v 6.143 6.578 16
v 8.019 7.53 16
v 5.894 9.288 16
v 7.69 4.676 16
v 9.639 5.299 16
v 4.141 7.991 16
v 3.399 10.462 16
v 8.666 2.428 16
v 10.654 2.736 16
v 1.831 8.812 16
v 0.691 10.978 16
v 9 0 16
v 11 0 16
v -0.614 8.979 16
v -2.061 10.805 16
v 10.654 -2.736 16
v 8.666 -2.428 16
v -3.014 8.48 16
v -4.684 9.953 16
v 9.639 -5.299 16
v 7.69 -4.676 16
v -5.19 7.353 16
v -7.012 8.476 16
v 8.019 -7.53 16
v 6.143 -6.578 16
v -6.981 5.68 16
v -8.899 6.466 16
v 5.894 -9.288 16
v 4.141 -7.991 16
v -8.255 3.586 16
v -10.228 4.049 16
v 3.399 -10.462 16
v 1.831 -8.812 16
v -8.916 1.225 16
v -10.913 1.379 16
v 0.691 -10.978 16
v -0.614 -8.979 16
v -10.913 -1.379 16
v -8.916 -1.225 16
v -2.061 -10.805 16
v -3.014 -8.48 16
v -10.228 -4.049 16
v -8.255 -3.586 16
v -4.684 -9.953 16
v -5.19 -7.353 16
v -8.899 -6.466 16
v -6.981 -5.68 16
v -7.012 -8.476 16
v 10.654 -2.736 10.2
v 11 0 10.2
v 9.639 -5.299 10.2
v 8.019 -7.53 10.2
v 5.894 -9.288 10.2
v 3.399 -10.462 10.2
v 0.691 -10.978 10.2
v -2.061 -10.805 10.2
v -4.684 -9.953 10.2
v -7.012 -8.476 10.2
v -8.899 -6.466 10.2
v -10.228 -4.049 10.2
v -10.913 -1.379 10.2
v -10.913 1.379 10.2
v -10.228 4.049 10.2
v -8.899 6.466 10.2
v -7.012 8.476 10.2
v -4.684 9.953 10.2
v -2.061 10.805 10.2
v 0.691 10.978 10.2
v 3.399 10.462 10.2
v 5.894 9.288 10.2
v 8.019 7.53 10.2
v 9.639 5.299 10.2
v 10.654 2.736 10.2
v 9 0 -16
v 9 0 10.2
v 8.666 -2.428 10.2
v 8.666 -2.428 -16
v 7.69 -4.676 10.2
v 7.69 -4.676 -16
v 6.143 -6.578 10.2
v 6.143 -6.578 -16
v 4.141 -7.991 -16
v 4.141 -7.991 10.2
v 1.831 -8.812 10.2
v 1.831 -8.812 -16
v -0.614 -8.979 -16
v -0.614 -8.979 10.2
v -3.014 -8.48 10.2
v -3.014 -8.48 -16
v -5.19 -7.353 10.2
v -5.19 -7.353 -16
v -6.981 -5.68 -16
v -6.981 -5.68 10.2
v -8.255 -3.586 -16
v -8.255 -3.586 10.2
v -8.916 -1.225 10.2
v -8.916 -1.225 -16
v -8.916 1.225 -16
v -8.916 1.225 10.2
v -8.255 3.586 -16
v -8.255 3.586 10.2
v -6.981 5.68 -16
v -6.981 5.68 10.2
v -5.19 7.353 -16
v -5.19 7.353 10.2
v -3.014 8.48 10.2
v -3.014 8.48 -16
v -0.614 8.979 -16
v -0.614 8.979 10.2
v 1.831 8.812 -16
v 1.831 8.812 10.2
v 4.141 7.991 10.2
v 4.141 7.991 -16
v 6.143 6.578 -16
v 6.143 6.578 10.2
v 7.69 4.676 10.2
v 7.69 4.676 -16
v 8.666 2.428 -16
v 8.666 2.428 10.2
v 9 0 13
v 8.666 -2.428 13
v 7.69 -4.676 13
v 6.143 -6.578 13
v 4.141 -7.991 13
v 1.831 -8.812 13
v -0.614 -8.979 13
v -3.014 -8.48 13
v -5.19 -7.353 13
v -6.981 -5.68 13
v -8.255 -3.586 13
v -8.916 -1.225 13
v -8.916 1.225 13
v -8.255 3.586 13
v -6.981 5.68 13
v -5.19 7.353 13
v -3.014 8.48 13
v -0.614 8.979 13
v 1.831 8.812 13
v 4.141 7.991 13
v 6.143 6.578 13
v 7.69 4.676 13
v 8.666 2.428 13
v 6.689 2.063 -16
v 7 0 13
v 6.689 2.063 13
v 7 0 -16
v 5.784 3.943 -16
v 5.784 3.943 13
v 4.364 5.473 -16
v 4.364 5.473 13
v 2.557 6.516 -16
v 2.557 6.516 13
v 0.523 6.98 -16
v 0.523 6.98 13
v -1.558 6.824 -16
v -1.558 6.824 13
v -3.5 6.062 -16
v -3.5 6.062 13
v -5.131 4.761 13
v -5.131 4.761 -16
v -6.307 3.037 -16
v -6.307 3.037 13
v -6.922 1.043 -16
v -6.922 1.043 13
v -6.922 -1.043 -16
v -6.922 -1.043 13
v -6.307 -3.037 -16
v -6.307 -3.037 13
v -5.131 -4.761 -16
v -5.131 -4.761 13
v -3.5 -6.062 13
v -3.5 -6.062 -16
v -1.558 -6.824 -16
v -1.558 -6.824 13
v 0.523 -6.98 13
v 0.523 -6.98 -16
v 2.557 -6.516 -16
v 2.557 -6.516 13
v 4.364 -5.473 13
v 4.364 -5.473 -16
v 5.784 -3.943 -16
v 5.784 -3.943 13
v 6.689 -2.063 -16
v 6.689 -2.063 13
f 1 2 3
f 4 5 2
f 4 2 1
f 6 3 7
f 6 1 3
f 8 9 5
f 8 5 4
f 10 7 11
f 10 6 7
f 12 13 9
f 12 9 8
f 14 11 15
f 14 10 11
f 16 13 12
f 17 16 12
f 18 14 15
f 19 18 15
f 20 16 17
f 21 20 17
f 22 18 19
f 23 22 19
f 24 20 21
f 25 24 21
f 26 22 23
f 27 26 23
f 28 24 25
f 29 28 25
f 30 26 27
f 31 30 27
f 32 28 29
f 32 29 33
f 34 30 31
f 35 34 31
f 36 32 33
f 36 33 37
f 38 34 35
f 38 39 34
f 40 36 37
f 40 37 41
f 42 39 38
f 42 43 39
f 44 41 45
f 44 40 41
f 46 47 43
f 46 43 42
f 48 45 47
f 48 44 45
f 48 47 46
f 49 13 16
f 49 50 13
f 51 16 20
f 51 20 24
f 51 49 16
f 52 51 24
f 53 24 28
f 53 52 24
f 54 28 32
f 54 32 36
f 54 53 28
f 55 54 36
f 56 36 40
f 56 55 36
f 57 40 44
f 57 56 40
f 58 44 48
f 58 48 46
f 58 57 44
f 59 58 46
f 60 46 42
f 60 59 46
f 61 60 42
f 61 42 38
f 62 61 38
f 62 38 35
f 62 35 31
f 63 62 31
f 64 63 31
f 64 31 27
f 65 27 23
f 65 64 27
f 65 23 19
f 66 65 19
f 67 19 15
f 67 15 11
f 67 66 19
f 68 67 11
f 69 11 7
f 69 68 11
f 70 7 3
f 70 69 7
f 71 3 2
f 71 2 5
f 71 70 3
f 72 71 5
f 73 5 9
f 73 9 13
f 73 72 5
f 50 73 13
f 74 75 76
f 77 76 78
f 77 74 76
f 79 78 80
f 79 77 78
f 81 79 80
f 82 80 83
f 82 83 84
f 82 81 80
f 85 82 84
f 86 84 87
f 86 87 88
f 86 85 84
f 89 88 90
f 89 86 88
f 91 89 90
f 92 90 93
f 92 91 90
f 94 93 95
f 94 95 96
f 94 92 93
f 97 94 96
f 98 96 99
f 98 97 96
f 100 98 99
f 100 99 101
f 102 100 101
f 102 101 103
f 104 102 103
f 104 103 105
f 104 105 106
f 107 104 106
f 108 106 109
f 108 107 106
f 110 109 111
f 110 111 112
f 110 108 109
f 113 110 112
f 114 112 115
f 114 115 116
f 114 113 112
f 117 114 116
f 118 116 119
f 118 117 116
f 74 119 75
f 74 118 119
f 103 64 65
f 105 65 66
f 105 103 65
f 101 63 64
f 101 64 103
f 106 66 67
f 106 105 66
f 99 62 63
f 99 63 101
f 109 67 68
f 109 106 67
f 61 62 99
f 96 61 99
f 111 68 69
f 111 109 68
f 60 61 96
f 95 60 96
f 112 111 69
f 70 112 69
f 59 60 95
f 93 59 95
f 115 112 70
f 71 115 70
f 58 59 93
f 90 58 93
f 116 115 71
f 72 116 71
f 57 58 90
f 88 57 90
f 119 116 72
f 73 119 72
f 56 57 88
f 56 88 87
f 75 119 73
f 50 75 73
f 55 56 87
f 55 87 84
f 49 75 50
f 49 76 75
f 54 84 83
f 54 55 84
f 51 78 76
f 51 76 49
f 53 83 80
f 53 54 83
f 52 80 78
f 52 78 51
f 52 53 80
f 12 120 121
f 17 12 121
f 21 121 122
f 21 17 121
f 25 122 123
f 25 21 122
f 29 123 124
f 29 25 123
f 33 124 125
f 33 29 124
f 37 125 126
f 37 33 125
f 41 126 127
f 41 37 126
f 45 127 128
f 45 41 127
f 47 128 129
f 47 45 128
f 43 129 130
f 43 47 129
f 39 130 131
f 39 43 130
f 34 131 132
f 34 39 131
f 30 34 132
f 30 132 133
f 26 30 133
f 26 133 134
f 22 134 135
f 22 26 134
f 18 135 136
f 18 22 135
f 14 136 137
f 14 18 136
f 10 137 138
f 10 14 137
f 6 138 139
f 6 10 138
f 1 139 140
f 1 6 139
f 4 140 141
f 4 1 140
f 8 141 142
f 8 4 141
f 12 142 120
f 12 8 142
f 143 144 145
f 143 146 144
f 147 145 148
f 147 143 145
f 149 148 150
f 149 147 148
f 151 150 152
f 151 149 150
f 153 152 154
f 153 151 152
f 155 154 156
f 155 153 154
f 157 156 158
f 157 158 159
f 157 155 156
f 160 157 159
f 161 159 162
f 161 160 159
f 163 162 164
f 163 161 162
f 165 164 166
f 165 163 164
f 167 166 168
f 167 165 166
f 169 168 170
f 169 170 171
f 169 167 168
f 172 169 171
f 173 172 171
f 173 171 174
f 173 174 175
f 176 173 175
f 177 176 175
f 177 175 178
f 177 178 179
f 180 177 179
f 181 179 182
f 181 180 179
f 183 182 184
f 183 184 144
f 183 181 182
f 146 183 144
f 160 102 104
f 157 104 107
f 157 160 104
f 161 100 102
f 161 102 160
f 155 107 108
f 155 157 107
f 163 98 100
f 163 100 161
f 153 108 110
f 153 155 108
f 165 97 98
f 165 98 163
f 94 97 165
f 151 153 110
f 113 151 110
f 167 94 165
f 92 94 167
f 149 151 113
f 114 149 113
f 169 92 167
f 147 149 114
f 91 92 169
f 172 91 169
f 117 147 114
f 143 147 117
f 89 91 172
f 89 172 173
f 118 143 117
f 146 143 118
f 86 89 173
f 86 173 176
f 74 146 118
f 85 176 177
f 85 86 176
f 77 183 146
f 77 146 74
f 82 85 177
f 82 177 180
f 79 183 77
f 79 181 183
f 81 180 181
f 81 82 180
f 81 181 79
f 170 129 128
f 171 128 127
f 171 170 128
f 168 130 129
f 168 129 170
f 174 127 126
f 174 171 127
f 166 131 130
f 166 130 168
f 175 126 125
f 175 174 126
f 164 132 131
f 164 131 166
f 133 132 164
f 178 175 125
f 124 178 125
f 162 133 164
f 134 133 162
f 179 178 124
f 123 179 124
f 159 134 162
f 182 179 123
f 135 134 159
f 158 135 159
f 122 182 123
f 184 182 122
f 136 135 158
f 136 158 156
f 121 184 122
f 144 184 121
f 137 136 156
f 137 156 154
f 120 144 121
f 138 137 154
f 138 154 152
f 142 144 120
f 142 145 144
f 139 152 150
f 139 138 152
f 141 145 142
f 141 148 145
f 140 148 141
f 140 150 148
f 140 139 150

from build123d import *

# Parameters (mm, degrees)
SKETCH3_R           = 9
SKETCH3_R_2         = 7
BOSS_EXTRUDE1_DEPTH = 0.8


with BuildPart() as part:
    # Sketch2 → Revolve1 (revolve)
    with BuildSketch(Plane(origin=(0, 0, 0), x_dir=(0, 0, -1), z_dir=(1, 0, 0)), mode=Mode.PRIVATE) as revolve1_sk:
        Polygon((-16, 11), (-10.2, 11), (-10.2, 9), (16, 9), (16, 7), (-12.2, 7), (-12.2, 9), (-16, 9), align=None)
    revolve(revolve1_sk.sketch.rotate(Axis((0, 0, 152.237580052), (0, 0, -1)), 90), axis=Axis((0, 0, 152.237580052), (0, 0, -1)))  # turned: the seam where the file's is

    # Sketch3 → Boss-Extrude1 (add)
    with BuildSketch(Plane.XY.offset(12.2)):
        Circle(SKETCH3_R)
        Circle(SKETCH3_R_2, mode=Mode.SUBTRACT)
    extrude(amount=BOSS_EXTRUDE1_DEPTH)


solid = part.part
